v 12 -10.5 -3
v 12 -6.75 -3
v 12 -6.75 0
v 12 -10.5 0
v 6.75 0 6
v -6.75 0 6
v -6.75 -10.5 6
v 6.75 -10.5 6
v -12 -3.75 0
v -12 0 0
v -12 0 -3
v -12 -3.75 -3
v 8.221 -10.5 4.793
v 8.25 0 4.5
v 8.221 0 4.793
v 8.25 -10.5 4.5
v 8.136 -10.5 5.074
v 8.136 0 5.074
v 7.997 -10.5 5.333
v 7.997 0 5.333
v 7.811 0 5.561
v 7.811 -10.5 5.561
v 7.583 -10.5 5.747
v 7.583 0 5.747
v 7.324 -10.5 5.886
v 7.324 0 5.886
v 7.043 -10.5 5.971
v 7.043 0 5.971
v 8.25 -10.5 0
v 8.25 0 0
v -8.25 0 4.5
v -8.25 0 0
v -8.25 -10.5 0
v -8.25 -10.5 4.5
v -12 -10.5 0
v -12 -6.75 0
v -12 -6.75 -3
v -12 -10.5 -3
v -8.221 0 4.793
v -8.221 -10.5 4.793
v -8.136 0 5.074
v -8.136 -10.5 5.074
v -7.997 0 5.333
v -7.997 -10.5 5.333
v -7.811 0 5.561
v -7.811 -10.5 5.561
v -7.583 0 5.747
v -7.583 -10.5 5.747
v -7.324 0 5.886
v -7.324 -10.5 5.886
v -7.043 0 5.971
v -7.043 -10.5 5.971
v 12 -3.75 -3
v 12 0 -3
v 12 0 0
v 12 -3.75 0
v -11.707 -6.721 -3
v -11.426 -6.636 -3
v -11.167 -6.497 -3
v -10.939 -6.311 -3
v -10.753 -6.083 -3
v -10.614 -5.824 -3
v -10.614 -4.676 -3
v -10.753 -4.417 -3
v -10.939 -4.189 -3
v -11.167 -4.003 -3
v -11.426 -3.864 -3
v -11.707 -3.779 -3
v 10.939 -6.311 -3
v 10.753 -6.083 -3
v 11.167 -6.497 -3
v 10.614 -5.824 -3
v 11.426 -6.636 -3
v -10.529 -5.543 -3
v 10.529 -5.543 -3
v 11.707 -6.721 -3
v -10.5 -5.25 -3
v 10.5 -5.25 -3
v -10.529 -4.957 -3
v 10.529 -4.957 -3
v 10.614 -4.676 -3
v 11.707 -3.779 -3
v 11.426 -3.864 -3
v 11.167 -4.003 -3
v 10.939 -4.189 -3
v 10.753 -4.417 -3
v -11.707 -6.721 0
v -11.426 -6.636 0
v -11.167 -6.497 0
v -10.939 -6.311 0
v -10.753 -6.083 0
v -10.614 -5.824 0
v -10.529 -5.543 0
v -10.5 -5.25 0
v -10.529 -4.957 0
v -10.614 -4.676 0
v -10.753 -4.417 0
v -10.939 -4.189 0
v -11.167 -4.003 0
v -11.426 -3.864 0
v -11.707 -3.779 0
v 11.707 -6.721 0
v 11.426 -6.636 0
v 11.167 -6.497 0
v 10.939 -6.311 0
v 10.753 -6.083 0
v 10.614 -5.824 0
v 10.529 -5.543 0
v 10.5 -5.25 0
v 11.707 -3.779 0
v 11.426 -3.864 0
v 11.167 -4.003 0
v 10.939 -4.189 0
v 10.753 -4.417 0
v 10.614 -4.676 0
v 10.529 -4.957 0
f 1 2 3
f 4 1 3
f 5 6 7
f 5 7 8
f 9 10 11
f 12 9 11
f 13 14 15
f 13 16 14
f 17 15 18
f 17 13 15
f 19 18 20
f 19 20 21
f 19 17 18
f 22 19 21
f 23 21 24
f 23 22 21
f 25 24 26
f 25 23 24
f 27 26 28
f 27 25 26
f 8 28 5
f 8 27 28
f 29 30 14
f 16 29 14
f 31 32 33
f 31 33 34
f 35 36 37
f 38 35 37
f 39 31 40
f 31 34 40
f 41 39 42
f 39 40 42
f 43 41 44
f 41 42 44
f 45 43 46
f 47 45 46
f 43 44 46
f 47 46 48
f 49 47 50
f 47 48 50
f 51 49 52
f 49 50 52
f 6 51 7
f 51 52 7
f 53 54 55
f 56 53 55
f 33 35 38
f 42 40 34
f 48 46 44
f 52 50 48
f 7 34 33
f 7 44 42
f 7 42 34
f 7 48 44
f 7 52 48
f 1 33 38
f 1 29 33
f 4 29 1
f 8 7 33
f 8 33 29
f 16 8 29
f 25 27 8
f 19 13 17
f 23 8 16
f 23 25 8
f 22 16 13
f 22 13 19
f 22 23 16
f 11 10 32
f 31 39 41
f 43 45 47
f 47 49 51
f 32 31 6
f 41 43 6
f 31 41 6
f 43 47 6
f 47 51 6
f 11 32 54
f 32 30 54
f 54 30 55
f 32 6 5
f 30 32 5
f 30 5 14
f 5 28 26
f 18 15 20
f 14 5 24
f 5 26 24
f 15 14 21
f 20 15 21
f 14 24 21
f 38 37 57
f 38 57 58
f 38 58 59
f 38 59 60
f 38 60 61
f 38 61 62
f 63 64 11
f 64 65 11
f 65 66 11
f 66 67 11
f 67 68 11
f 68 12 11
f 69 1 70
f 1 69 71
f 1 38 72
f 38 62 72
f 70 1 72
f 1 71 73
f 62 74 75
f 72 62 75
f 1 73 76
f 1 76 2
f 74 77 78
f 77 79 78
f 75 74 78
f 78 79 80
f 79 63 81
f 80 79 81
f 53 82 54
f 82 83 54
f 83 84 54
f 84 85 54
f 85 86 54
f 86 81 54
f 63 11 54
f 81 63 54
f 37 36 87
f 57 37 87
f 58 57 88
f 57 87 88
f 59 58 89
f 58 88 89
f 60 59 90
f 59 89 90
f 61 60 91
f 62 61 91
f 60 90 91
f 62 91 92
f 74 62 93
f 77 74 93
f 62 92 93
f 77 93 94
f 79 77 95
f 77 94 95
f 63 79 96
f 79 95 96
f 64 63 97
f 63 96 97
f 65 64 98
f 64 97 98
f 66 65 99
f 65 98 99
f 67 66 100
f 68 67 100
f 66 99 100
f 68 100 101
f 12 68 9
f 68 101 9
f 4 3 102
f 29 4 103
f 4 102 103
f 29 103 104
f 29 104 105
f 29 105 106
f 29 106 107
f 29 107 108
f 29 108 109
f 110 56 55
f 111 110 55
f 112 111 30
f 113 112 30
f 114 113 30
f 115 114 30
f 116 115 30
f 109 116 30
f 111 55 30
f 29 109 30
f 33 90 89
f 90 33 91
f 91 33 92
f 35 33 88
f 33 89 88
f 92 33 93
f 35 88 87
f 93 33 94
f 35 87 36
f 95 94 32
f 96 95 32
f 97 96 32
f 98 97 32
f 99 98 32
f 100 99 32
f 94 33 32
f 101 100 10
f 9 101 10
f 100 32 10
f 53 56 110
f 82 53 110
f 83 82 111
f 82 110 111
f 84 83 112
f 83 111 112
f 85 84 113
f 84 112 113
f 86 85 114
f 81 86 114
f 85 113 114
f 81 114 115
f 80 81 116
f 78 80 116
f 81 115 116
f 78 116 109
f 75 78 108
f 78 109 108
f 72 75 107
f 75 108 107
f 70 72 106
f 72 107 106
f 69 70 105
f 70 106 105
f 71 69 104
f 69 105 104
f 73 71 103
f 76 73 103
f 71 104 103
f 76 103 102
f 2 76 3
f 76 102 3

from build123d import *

# Parameters (mm, degrees)
F0_W     = 1.1
F0_H     = 0.4
F1_DEPTH = 0.7
F2_R     = 0.1
F4_DEPTH = 25
F5_SCALE = 15


with BuildPart() as f1:
    # F0 (on Front) → F1 (new body)
    with BuildSketch(Plane.XZ):
        with Locations((0, 0.2)):
            Rectangle(F0_W, F0_H)
        Polygon((0.55, 0), (-0.55, 0), (-0.8, 0), (-0.8, -0.2), (0.8, -0.2), (0.8, 0), align=None)
    extrude(amount=F1_DEPTH)

    # F2
    f2_edges = [f1.edges().sort_by_distance(p)[0] for p in [
        (-0.55, -0.35, 0.4),
        (0.55, -0.35, 0.4),
    ]]
    fillet(f2_edges, radius=F2_R)

    # F3 (on face) → F4 (cut)
    with BuildSketch(Plane.XY):
        with BuildLine():
            Line((-0.8, -0.25), (-0.8, -0.45))
            ThreePointArc((-0.8, -0.45), (-0.7, -0.35), (-0.8, -0.25))
        make_face()
        with BuildLine():
            Line((0.8, -0.45), (0.8, -0.25))
            ThreePointArc((0.8, -0.25), (0.7, -0.35), (0.8, -0.45))
        make_face()
    extrude(amount=-F4_DEPTH, mode=Mode.SUBTRACT)


with BuildPart() as f1_1:
    # F5: moved
    add(f1.part.scale(F5_SCALE))


solid = f1_1.part
